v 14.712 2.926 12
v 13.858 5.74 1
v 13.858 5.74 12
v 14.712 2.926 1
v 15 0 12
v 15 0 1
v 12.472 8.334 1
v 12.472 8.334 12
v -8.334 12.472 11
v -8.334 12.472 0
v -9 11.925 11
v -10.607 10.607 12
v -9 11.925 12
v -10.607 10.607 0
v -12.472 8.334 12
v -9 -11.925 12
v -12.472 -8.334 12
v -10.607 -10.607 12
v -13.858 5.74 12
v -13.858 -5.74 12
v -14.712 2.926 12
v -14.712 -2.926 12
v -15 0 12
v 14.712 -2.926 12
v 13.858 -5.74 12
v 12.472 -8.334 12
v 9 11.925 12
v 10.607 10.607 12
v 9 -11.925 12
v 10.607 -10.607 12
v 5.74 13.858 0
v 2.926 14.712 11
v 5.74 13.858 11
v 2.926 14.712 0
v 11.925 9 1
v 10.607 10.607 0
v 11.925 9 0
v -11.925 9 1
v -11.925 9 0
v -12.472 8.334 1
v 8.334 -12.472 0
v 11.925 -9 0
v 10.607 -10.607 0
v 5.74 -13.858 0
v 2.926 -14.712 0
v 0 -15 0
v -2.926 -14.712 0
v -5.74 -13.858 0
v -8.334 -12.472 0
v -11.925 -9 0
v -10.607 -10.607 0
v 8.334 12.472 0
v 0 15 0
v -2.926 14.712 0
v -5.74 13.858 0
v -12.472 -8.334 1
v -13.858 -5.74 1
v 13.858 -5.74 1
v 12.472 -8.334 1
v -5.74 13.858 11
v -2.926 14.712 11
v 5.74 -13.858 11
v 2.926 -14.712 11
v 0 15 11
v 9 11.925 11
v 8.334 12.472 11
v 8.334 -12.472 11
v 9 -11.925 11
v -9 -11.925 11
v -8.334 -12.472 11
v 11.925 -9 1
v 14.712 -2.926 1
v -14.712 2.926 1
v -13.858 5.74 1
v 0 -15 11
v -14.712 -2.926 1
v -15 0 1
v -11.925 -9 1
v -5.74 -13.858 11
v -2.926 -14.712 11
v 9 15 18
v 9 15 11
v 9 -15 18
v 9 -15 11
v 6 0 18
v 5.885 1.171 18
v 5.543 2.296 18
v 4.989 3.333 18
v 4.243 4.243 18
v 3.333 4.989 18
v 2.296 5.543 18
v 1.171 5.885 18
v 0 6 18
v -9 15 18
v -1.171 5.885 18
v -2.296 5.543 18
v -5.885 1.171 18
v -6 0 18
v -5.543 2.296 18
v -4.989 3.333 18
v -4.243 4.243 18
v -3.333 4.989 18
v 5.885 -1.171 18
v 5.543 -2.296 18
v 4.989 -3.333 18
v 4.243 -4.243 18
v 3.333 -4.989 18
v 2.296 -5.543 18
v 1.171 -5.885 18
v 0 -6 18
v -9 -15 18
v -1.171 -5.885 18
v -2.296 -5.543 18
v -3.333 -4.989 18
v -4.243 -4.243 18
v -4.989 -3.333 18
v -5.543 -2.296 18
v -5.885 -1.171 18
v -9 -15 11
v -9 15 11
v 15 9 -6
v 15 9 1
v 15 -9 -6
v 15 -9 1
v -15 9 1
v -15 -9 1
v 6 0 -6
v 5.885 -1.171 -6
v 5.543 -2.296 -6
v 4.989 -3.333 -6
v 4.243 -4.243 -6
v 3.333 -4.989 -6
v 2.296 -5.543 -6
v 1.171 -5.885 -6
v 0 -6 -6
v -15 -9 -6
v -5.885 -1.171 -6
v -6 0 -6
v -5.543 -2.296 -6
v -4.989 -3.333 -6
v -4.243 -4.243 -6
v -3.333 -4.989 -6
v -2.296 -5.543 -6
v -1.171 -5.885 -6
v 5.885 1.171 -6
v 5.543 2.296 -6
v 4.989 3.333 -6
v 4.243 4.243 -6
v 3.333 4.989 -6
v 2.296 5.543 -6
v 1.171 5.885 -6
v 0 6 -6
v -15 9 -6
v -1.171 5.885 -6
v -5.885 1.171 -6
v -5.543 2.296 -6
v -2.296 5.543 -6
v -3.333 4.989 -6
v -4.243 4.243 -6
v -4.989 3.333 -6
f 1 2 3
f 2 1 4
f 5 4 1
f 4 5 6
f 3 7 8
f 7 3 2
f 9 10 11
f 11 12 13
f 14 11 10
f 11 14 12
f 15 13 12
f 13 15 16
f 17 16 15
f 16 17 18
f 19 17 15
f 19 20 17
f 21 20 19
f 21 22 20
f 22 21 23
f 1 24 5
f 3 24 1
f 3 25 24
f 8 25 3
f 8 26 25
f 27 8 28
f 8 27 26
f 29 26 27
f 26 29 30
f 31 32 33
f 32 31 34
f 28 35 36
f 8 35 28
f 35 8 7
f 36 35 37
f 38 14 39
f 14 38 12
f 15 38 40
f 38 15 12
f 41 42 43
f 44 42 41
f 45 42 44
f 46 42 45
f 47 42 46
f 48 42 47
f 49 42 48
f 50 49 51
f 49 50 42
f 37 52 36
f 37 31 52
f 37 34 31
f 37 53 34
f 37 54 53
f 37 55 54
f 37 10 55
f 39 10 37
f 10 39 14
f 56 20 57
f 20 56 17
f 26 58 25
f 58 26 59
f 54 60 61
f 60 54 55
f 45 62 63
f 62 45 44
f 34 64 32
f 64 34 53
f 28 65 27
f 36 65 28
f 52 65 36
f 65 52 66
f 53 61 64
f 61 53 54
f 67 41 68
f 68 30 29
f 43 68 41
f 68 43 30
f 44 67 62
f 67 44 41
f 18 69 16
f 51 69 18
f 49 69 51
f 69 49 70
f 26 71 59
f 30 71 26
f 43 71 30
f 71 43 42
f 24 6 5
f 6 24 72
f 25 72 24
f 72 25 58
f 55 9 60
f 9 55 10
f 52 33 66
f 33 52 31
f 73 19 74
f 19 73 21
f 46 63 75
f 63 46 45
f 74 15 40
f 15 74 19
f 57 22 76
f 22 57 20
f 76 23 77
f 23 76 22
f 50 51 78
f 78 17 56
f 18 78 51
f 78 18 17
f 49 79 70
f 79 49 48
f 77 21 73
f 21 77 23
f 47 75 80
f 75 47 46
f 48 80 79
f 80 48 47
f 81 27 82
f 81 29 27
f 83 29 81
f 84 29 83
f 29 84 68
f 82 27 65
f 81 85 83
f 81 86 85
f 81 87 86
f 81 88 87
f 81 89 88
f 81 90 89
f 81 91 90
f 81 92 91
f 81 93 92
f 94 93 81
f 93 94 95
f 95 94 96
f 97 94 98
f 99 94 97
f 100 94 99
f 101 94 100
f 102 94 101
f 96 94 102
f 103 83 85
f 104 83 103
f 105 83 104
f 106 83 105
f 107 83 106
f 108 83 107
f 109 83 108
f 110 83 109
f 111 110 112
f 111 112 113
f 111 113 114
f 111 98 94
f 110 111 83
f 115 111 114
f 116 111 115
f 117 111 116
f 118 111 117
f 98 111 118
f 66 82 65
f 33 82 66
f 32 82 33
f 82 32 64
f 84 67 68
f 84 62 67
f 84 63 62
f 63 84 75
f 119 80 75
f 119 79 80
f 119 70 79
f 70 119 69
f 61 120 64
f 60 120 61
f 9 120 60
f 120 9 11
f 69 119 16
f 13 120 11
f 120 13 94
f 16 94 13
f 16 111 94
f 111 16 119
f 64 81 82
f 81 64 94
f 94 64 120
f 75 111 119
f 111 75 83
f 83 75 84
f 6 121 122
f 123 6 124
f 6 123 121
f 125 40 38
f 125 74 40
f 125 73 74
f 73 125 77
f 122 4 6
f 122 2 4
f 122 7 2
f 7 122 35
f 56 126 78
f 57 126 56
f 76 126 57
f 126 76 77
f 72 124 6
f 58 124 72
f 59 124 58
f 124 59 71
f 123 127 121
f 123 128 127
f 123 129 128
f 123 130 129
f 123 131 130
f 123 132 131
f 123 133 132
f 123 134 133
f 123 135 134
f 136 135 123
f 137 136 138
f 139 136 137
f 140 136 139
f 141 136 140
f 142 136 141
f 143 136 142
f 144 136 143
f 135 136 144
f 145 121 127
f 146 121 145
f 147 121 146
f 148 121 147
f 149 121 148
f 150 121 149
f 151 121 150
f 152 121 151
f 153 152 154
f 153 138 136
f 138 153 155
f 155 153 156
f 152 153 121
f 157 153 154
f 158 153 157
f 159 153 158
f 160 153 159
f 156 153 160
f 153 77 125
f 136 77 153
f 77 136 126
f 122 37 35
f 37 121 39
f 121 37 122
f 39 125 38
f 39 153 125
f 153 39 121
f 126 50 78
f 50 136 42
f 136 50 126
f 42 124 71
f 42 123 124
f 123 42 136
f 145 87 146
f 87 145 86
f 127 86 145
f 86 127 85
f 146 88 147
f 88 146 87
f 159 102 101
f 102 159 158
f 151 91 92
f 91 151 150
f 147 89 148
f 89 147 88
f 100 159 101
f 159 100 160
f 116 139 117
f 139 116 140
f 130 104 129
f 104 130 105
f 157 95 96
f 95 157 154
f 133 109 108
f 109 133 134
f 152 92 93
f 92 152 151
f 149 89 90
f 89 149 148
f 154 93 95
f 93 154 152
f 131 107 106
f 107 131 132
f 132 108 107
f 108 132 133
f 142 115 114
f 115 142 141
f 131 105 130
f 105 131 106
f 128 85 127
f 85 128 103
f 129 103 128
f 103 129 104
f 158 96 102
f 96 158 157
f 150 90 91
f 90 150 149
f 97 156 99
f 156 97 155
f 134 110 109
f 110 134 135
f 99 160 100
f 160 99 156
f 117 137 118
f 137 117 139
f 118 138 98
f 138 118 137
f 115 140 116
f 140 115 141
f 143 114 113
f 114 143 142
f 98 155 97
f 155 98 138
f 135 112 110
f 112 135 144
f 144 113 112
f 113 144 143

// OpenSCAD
$fn = 32;

// ----------------------------------------------------------------------
// Oldham coupling disc: 30 x 24 mm
// ----------------------------------------------------------------------

// --- parameters (mm) ---
disc_d = 30;              // disc diameter
disc_t = 12;              // disc thickness
tongue_w = 18;            // tongue width
tongue_h = 6;             // tongue height
bore_d = 12;              // centre lightening bore

module disc() {
  cylinder(h = disc_t, d = disc_d);
  /* tongue on the top face, sunk 1 mm into the disc */
  translate([-tongue_w / 2, -disc_d / 2, disc_t - 1]) cube([tongue_w, disc_d, tongue_h + 1]);
  /* slot wall on the bottom face, 90 degrees turned */
  translate([-disc_d / 2, -tongue_w / 2, -tongue_h]) cube([disc_d, tongue_w, tongue_h + 1]);
}

difference() {
  disc();
  translate([0, 0, -tongue_h - 1]) cylinder(h = disc_t + 2 * tongue_h + 2, d = bore_d);
}
